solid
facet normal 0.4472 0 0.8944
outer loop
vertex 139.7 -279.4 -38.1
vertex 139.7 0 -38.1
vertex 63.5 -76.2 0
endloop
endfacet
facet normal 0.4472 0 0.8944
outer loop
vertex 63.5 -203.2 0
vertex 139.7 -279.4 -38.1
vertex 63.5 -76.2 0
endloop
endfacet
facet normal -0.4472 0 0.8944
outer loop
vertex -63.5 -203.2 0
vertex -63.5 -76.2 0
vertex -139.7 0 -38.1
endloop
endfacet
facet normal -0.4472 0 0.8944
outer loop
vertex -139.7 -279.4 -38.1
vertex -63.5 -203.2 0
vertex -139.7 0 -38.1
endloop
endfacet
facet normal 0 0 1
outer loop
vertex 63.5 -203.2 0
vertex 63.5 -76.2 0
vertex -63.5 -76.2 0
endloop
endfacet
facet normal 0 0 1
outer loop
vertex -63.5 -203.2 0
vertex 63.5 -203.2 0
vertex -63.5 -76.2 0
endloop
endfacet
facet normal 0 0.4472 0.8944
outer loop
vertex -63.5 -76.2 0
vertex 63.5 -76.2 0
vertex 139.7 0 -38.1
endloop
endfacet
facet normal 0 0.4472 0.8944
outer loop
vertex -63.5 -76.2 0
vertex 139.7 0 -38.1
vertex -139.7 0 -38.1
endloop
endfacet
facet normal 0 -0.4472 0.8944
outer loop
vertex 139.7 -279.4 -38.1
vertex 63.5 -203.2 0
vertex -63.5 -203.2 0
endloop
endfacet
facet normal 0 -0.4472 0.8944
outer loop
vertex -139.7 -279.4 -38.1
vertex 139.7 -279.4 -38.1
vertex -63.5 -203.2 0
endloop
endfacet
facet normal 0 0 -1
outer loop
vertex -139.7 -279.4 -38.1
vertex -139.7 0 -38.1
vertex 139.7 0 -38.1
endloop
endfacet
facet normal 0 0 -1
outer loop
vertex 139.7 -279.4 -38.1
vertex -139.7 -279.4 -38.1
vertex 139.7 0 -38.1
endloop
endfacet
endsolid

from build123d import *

# Parameters (mm, degrees)
F0_W       = 63.5
F0_H       = 38.1
F1_DEPTH   = 279.4
F2_SIZE2   = 76.19999
F2_SIZE    = 38.09999
F2_2_SIZE2 = 76.19999
F2_2_SIZE  = 38.09999


# Not quite as in the source:
# - a fillet or chamfer is up to 0.001 mm smaller than in the source, because OpenCascade refuses the exact size


with BuildPart() as f1:
    # F0 (on Front) → F1 (new body)
    with BuildSketch(Plane.XZ):
        with Locations((-31.75, -19.05)):
            Rectangle(F0_W, F0_H)
        Polygon((0, 0), (0, -38.1), (139.7, -38.1), (63.5, 0), align=None)
        Polygon((-63.5, 0), (-139.7, -38.1), (-63.5, -38.1), align=None)
    extrude(amount=F1_DEPTH)

    # F2 (size 38.1 and 76.2 in the source; OpenCascade refuses exactly that, so slightly less here)
    f2_edges = [f1.edges().sort_by_distance(p)[0] for p in [
        (0, -279.4, 0),
    ]]
    f2_side = f1.faces().sort_by_distance((0, -279.4, -21.43125))[0]
    chamfer(f2_edges, length=F2_SIZE, length2=F2_SIZE2, reference=f2_side)

    # F2#2 (size 38.1 and 76.2 in the source; OpenCascade refuses exactly that, so slightly less here)
    f2_2_edges = [f1.edges().sort_by_distance(p)[0] for p in [
        (0, 0, 0),
    ]]
    f2_2_side = f1.faces().sort_by_distance((0, 0, -21.43125))[0]
    chamfer(f2_2_edges, length=F2_2_SIZE, length2=F2_2_SIZE2, reference=f2_2_side)


solid = f1.part
